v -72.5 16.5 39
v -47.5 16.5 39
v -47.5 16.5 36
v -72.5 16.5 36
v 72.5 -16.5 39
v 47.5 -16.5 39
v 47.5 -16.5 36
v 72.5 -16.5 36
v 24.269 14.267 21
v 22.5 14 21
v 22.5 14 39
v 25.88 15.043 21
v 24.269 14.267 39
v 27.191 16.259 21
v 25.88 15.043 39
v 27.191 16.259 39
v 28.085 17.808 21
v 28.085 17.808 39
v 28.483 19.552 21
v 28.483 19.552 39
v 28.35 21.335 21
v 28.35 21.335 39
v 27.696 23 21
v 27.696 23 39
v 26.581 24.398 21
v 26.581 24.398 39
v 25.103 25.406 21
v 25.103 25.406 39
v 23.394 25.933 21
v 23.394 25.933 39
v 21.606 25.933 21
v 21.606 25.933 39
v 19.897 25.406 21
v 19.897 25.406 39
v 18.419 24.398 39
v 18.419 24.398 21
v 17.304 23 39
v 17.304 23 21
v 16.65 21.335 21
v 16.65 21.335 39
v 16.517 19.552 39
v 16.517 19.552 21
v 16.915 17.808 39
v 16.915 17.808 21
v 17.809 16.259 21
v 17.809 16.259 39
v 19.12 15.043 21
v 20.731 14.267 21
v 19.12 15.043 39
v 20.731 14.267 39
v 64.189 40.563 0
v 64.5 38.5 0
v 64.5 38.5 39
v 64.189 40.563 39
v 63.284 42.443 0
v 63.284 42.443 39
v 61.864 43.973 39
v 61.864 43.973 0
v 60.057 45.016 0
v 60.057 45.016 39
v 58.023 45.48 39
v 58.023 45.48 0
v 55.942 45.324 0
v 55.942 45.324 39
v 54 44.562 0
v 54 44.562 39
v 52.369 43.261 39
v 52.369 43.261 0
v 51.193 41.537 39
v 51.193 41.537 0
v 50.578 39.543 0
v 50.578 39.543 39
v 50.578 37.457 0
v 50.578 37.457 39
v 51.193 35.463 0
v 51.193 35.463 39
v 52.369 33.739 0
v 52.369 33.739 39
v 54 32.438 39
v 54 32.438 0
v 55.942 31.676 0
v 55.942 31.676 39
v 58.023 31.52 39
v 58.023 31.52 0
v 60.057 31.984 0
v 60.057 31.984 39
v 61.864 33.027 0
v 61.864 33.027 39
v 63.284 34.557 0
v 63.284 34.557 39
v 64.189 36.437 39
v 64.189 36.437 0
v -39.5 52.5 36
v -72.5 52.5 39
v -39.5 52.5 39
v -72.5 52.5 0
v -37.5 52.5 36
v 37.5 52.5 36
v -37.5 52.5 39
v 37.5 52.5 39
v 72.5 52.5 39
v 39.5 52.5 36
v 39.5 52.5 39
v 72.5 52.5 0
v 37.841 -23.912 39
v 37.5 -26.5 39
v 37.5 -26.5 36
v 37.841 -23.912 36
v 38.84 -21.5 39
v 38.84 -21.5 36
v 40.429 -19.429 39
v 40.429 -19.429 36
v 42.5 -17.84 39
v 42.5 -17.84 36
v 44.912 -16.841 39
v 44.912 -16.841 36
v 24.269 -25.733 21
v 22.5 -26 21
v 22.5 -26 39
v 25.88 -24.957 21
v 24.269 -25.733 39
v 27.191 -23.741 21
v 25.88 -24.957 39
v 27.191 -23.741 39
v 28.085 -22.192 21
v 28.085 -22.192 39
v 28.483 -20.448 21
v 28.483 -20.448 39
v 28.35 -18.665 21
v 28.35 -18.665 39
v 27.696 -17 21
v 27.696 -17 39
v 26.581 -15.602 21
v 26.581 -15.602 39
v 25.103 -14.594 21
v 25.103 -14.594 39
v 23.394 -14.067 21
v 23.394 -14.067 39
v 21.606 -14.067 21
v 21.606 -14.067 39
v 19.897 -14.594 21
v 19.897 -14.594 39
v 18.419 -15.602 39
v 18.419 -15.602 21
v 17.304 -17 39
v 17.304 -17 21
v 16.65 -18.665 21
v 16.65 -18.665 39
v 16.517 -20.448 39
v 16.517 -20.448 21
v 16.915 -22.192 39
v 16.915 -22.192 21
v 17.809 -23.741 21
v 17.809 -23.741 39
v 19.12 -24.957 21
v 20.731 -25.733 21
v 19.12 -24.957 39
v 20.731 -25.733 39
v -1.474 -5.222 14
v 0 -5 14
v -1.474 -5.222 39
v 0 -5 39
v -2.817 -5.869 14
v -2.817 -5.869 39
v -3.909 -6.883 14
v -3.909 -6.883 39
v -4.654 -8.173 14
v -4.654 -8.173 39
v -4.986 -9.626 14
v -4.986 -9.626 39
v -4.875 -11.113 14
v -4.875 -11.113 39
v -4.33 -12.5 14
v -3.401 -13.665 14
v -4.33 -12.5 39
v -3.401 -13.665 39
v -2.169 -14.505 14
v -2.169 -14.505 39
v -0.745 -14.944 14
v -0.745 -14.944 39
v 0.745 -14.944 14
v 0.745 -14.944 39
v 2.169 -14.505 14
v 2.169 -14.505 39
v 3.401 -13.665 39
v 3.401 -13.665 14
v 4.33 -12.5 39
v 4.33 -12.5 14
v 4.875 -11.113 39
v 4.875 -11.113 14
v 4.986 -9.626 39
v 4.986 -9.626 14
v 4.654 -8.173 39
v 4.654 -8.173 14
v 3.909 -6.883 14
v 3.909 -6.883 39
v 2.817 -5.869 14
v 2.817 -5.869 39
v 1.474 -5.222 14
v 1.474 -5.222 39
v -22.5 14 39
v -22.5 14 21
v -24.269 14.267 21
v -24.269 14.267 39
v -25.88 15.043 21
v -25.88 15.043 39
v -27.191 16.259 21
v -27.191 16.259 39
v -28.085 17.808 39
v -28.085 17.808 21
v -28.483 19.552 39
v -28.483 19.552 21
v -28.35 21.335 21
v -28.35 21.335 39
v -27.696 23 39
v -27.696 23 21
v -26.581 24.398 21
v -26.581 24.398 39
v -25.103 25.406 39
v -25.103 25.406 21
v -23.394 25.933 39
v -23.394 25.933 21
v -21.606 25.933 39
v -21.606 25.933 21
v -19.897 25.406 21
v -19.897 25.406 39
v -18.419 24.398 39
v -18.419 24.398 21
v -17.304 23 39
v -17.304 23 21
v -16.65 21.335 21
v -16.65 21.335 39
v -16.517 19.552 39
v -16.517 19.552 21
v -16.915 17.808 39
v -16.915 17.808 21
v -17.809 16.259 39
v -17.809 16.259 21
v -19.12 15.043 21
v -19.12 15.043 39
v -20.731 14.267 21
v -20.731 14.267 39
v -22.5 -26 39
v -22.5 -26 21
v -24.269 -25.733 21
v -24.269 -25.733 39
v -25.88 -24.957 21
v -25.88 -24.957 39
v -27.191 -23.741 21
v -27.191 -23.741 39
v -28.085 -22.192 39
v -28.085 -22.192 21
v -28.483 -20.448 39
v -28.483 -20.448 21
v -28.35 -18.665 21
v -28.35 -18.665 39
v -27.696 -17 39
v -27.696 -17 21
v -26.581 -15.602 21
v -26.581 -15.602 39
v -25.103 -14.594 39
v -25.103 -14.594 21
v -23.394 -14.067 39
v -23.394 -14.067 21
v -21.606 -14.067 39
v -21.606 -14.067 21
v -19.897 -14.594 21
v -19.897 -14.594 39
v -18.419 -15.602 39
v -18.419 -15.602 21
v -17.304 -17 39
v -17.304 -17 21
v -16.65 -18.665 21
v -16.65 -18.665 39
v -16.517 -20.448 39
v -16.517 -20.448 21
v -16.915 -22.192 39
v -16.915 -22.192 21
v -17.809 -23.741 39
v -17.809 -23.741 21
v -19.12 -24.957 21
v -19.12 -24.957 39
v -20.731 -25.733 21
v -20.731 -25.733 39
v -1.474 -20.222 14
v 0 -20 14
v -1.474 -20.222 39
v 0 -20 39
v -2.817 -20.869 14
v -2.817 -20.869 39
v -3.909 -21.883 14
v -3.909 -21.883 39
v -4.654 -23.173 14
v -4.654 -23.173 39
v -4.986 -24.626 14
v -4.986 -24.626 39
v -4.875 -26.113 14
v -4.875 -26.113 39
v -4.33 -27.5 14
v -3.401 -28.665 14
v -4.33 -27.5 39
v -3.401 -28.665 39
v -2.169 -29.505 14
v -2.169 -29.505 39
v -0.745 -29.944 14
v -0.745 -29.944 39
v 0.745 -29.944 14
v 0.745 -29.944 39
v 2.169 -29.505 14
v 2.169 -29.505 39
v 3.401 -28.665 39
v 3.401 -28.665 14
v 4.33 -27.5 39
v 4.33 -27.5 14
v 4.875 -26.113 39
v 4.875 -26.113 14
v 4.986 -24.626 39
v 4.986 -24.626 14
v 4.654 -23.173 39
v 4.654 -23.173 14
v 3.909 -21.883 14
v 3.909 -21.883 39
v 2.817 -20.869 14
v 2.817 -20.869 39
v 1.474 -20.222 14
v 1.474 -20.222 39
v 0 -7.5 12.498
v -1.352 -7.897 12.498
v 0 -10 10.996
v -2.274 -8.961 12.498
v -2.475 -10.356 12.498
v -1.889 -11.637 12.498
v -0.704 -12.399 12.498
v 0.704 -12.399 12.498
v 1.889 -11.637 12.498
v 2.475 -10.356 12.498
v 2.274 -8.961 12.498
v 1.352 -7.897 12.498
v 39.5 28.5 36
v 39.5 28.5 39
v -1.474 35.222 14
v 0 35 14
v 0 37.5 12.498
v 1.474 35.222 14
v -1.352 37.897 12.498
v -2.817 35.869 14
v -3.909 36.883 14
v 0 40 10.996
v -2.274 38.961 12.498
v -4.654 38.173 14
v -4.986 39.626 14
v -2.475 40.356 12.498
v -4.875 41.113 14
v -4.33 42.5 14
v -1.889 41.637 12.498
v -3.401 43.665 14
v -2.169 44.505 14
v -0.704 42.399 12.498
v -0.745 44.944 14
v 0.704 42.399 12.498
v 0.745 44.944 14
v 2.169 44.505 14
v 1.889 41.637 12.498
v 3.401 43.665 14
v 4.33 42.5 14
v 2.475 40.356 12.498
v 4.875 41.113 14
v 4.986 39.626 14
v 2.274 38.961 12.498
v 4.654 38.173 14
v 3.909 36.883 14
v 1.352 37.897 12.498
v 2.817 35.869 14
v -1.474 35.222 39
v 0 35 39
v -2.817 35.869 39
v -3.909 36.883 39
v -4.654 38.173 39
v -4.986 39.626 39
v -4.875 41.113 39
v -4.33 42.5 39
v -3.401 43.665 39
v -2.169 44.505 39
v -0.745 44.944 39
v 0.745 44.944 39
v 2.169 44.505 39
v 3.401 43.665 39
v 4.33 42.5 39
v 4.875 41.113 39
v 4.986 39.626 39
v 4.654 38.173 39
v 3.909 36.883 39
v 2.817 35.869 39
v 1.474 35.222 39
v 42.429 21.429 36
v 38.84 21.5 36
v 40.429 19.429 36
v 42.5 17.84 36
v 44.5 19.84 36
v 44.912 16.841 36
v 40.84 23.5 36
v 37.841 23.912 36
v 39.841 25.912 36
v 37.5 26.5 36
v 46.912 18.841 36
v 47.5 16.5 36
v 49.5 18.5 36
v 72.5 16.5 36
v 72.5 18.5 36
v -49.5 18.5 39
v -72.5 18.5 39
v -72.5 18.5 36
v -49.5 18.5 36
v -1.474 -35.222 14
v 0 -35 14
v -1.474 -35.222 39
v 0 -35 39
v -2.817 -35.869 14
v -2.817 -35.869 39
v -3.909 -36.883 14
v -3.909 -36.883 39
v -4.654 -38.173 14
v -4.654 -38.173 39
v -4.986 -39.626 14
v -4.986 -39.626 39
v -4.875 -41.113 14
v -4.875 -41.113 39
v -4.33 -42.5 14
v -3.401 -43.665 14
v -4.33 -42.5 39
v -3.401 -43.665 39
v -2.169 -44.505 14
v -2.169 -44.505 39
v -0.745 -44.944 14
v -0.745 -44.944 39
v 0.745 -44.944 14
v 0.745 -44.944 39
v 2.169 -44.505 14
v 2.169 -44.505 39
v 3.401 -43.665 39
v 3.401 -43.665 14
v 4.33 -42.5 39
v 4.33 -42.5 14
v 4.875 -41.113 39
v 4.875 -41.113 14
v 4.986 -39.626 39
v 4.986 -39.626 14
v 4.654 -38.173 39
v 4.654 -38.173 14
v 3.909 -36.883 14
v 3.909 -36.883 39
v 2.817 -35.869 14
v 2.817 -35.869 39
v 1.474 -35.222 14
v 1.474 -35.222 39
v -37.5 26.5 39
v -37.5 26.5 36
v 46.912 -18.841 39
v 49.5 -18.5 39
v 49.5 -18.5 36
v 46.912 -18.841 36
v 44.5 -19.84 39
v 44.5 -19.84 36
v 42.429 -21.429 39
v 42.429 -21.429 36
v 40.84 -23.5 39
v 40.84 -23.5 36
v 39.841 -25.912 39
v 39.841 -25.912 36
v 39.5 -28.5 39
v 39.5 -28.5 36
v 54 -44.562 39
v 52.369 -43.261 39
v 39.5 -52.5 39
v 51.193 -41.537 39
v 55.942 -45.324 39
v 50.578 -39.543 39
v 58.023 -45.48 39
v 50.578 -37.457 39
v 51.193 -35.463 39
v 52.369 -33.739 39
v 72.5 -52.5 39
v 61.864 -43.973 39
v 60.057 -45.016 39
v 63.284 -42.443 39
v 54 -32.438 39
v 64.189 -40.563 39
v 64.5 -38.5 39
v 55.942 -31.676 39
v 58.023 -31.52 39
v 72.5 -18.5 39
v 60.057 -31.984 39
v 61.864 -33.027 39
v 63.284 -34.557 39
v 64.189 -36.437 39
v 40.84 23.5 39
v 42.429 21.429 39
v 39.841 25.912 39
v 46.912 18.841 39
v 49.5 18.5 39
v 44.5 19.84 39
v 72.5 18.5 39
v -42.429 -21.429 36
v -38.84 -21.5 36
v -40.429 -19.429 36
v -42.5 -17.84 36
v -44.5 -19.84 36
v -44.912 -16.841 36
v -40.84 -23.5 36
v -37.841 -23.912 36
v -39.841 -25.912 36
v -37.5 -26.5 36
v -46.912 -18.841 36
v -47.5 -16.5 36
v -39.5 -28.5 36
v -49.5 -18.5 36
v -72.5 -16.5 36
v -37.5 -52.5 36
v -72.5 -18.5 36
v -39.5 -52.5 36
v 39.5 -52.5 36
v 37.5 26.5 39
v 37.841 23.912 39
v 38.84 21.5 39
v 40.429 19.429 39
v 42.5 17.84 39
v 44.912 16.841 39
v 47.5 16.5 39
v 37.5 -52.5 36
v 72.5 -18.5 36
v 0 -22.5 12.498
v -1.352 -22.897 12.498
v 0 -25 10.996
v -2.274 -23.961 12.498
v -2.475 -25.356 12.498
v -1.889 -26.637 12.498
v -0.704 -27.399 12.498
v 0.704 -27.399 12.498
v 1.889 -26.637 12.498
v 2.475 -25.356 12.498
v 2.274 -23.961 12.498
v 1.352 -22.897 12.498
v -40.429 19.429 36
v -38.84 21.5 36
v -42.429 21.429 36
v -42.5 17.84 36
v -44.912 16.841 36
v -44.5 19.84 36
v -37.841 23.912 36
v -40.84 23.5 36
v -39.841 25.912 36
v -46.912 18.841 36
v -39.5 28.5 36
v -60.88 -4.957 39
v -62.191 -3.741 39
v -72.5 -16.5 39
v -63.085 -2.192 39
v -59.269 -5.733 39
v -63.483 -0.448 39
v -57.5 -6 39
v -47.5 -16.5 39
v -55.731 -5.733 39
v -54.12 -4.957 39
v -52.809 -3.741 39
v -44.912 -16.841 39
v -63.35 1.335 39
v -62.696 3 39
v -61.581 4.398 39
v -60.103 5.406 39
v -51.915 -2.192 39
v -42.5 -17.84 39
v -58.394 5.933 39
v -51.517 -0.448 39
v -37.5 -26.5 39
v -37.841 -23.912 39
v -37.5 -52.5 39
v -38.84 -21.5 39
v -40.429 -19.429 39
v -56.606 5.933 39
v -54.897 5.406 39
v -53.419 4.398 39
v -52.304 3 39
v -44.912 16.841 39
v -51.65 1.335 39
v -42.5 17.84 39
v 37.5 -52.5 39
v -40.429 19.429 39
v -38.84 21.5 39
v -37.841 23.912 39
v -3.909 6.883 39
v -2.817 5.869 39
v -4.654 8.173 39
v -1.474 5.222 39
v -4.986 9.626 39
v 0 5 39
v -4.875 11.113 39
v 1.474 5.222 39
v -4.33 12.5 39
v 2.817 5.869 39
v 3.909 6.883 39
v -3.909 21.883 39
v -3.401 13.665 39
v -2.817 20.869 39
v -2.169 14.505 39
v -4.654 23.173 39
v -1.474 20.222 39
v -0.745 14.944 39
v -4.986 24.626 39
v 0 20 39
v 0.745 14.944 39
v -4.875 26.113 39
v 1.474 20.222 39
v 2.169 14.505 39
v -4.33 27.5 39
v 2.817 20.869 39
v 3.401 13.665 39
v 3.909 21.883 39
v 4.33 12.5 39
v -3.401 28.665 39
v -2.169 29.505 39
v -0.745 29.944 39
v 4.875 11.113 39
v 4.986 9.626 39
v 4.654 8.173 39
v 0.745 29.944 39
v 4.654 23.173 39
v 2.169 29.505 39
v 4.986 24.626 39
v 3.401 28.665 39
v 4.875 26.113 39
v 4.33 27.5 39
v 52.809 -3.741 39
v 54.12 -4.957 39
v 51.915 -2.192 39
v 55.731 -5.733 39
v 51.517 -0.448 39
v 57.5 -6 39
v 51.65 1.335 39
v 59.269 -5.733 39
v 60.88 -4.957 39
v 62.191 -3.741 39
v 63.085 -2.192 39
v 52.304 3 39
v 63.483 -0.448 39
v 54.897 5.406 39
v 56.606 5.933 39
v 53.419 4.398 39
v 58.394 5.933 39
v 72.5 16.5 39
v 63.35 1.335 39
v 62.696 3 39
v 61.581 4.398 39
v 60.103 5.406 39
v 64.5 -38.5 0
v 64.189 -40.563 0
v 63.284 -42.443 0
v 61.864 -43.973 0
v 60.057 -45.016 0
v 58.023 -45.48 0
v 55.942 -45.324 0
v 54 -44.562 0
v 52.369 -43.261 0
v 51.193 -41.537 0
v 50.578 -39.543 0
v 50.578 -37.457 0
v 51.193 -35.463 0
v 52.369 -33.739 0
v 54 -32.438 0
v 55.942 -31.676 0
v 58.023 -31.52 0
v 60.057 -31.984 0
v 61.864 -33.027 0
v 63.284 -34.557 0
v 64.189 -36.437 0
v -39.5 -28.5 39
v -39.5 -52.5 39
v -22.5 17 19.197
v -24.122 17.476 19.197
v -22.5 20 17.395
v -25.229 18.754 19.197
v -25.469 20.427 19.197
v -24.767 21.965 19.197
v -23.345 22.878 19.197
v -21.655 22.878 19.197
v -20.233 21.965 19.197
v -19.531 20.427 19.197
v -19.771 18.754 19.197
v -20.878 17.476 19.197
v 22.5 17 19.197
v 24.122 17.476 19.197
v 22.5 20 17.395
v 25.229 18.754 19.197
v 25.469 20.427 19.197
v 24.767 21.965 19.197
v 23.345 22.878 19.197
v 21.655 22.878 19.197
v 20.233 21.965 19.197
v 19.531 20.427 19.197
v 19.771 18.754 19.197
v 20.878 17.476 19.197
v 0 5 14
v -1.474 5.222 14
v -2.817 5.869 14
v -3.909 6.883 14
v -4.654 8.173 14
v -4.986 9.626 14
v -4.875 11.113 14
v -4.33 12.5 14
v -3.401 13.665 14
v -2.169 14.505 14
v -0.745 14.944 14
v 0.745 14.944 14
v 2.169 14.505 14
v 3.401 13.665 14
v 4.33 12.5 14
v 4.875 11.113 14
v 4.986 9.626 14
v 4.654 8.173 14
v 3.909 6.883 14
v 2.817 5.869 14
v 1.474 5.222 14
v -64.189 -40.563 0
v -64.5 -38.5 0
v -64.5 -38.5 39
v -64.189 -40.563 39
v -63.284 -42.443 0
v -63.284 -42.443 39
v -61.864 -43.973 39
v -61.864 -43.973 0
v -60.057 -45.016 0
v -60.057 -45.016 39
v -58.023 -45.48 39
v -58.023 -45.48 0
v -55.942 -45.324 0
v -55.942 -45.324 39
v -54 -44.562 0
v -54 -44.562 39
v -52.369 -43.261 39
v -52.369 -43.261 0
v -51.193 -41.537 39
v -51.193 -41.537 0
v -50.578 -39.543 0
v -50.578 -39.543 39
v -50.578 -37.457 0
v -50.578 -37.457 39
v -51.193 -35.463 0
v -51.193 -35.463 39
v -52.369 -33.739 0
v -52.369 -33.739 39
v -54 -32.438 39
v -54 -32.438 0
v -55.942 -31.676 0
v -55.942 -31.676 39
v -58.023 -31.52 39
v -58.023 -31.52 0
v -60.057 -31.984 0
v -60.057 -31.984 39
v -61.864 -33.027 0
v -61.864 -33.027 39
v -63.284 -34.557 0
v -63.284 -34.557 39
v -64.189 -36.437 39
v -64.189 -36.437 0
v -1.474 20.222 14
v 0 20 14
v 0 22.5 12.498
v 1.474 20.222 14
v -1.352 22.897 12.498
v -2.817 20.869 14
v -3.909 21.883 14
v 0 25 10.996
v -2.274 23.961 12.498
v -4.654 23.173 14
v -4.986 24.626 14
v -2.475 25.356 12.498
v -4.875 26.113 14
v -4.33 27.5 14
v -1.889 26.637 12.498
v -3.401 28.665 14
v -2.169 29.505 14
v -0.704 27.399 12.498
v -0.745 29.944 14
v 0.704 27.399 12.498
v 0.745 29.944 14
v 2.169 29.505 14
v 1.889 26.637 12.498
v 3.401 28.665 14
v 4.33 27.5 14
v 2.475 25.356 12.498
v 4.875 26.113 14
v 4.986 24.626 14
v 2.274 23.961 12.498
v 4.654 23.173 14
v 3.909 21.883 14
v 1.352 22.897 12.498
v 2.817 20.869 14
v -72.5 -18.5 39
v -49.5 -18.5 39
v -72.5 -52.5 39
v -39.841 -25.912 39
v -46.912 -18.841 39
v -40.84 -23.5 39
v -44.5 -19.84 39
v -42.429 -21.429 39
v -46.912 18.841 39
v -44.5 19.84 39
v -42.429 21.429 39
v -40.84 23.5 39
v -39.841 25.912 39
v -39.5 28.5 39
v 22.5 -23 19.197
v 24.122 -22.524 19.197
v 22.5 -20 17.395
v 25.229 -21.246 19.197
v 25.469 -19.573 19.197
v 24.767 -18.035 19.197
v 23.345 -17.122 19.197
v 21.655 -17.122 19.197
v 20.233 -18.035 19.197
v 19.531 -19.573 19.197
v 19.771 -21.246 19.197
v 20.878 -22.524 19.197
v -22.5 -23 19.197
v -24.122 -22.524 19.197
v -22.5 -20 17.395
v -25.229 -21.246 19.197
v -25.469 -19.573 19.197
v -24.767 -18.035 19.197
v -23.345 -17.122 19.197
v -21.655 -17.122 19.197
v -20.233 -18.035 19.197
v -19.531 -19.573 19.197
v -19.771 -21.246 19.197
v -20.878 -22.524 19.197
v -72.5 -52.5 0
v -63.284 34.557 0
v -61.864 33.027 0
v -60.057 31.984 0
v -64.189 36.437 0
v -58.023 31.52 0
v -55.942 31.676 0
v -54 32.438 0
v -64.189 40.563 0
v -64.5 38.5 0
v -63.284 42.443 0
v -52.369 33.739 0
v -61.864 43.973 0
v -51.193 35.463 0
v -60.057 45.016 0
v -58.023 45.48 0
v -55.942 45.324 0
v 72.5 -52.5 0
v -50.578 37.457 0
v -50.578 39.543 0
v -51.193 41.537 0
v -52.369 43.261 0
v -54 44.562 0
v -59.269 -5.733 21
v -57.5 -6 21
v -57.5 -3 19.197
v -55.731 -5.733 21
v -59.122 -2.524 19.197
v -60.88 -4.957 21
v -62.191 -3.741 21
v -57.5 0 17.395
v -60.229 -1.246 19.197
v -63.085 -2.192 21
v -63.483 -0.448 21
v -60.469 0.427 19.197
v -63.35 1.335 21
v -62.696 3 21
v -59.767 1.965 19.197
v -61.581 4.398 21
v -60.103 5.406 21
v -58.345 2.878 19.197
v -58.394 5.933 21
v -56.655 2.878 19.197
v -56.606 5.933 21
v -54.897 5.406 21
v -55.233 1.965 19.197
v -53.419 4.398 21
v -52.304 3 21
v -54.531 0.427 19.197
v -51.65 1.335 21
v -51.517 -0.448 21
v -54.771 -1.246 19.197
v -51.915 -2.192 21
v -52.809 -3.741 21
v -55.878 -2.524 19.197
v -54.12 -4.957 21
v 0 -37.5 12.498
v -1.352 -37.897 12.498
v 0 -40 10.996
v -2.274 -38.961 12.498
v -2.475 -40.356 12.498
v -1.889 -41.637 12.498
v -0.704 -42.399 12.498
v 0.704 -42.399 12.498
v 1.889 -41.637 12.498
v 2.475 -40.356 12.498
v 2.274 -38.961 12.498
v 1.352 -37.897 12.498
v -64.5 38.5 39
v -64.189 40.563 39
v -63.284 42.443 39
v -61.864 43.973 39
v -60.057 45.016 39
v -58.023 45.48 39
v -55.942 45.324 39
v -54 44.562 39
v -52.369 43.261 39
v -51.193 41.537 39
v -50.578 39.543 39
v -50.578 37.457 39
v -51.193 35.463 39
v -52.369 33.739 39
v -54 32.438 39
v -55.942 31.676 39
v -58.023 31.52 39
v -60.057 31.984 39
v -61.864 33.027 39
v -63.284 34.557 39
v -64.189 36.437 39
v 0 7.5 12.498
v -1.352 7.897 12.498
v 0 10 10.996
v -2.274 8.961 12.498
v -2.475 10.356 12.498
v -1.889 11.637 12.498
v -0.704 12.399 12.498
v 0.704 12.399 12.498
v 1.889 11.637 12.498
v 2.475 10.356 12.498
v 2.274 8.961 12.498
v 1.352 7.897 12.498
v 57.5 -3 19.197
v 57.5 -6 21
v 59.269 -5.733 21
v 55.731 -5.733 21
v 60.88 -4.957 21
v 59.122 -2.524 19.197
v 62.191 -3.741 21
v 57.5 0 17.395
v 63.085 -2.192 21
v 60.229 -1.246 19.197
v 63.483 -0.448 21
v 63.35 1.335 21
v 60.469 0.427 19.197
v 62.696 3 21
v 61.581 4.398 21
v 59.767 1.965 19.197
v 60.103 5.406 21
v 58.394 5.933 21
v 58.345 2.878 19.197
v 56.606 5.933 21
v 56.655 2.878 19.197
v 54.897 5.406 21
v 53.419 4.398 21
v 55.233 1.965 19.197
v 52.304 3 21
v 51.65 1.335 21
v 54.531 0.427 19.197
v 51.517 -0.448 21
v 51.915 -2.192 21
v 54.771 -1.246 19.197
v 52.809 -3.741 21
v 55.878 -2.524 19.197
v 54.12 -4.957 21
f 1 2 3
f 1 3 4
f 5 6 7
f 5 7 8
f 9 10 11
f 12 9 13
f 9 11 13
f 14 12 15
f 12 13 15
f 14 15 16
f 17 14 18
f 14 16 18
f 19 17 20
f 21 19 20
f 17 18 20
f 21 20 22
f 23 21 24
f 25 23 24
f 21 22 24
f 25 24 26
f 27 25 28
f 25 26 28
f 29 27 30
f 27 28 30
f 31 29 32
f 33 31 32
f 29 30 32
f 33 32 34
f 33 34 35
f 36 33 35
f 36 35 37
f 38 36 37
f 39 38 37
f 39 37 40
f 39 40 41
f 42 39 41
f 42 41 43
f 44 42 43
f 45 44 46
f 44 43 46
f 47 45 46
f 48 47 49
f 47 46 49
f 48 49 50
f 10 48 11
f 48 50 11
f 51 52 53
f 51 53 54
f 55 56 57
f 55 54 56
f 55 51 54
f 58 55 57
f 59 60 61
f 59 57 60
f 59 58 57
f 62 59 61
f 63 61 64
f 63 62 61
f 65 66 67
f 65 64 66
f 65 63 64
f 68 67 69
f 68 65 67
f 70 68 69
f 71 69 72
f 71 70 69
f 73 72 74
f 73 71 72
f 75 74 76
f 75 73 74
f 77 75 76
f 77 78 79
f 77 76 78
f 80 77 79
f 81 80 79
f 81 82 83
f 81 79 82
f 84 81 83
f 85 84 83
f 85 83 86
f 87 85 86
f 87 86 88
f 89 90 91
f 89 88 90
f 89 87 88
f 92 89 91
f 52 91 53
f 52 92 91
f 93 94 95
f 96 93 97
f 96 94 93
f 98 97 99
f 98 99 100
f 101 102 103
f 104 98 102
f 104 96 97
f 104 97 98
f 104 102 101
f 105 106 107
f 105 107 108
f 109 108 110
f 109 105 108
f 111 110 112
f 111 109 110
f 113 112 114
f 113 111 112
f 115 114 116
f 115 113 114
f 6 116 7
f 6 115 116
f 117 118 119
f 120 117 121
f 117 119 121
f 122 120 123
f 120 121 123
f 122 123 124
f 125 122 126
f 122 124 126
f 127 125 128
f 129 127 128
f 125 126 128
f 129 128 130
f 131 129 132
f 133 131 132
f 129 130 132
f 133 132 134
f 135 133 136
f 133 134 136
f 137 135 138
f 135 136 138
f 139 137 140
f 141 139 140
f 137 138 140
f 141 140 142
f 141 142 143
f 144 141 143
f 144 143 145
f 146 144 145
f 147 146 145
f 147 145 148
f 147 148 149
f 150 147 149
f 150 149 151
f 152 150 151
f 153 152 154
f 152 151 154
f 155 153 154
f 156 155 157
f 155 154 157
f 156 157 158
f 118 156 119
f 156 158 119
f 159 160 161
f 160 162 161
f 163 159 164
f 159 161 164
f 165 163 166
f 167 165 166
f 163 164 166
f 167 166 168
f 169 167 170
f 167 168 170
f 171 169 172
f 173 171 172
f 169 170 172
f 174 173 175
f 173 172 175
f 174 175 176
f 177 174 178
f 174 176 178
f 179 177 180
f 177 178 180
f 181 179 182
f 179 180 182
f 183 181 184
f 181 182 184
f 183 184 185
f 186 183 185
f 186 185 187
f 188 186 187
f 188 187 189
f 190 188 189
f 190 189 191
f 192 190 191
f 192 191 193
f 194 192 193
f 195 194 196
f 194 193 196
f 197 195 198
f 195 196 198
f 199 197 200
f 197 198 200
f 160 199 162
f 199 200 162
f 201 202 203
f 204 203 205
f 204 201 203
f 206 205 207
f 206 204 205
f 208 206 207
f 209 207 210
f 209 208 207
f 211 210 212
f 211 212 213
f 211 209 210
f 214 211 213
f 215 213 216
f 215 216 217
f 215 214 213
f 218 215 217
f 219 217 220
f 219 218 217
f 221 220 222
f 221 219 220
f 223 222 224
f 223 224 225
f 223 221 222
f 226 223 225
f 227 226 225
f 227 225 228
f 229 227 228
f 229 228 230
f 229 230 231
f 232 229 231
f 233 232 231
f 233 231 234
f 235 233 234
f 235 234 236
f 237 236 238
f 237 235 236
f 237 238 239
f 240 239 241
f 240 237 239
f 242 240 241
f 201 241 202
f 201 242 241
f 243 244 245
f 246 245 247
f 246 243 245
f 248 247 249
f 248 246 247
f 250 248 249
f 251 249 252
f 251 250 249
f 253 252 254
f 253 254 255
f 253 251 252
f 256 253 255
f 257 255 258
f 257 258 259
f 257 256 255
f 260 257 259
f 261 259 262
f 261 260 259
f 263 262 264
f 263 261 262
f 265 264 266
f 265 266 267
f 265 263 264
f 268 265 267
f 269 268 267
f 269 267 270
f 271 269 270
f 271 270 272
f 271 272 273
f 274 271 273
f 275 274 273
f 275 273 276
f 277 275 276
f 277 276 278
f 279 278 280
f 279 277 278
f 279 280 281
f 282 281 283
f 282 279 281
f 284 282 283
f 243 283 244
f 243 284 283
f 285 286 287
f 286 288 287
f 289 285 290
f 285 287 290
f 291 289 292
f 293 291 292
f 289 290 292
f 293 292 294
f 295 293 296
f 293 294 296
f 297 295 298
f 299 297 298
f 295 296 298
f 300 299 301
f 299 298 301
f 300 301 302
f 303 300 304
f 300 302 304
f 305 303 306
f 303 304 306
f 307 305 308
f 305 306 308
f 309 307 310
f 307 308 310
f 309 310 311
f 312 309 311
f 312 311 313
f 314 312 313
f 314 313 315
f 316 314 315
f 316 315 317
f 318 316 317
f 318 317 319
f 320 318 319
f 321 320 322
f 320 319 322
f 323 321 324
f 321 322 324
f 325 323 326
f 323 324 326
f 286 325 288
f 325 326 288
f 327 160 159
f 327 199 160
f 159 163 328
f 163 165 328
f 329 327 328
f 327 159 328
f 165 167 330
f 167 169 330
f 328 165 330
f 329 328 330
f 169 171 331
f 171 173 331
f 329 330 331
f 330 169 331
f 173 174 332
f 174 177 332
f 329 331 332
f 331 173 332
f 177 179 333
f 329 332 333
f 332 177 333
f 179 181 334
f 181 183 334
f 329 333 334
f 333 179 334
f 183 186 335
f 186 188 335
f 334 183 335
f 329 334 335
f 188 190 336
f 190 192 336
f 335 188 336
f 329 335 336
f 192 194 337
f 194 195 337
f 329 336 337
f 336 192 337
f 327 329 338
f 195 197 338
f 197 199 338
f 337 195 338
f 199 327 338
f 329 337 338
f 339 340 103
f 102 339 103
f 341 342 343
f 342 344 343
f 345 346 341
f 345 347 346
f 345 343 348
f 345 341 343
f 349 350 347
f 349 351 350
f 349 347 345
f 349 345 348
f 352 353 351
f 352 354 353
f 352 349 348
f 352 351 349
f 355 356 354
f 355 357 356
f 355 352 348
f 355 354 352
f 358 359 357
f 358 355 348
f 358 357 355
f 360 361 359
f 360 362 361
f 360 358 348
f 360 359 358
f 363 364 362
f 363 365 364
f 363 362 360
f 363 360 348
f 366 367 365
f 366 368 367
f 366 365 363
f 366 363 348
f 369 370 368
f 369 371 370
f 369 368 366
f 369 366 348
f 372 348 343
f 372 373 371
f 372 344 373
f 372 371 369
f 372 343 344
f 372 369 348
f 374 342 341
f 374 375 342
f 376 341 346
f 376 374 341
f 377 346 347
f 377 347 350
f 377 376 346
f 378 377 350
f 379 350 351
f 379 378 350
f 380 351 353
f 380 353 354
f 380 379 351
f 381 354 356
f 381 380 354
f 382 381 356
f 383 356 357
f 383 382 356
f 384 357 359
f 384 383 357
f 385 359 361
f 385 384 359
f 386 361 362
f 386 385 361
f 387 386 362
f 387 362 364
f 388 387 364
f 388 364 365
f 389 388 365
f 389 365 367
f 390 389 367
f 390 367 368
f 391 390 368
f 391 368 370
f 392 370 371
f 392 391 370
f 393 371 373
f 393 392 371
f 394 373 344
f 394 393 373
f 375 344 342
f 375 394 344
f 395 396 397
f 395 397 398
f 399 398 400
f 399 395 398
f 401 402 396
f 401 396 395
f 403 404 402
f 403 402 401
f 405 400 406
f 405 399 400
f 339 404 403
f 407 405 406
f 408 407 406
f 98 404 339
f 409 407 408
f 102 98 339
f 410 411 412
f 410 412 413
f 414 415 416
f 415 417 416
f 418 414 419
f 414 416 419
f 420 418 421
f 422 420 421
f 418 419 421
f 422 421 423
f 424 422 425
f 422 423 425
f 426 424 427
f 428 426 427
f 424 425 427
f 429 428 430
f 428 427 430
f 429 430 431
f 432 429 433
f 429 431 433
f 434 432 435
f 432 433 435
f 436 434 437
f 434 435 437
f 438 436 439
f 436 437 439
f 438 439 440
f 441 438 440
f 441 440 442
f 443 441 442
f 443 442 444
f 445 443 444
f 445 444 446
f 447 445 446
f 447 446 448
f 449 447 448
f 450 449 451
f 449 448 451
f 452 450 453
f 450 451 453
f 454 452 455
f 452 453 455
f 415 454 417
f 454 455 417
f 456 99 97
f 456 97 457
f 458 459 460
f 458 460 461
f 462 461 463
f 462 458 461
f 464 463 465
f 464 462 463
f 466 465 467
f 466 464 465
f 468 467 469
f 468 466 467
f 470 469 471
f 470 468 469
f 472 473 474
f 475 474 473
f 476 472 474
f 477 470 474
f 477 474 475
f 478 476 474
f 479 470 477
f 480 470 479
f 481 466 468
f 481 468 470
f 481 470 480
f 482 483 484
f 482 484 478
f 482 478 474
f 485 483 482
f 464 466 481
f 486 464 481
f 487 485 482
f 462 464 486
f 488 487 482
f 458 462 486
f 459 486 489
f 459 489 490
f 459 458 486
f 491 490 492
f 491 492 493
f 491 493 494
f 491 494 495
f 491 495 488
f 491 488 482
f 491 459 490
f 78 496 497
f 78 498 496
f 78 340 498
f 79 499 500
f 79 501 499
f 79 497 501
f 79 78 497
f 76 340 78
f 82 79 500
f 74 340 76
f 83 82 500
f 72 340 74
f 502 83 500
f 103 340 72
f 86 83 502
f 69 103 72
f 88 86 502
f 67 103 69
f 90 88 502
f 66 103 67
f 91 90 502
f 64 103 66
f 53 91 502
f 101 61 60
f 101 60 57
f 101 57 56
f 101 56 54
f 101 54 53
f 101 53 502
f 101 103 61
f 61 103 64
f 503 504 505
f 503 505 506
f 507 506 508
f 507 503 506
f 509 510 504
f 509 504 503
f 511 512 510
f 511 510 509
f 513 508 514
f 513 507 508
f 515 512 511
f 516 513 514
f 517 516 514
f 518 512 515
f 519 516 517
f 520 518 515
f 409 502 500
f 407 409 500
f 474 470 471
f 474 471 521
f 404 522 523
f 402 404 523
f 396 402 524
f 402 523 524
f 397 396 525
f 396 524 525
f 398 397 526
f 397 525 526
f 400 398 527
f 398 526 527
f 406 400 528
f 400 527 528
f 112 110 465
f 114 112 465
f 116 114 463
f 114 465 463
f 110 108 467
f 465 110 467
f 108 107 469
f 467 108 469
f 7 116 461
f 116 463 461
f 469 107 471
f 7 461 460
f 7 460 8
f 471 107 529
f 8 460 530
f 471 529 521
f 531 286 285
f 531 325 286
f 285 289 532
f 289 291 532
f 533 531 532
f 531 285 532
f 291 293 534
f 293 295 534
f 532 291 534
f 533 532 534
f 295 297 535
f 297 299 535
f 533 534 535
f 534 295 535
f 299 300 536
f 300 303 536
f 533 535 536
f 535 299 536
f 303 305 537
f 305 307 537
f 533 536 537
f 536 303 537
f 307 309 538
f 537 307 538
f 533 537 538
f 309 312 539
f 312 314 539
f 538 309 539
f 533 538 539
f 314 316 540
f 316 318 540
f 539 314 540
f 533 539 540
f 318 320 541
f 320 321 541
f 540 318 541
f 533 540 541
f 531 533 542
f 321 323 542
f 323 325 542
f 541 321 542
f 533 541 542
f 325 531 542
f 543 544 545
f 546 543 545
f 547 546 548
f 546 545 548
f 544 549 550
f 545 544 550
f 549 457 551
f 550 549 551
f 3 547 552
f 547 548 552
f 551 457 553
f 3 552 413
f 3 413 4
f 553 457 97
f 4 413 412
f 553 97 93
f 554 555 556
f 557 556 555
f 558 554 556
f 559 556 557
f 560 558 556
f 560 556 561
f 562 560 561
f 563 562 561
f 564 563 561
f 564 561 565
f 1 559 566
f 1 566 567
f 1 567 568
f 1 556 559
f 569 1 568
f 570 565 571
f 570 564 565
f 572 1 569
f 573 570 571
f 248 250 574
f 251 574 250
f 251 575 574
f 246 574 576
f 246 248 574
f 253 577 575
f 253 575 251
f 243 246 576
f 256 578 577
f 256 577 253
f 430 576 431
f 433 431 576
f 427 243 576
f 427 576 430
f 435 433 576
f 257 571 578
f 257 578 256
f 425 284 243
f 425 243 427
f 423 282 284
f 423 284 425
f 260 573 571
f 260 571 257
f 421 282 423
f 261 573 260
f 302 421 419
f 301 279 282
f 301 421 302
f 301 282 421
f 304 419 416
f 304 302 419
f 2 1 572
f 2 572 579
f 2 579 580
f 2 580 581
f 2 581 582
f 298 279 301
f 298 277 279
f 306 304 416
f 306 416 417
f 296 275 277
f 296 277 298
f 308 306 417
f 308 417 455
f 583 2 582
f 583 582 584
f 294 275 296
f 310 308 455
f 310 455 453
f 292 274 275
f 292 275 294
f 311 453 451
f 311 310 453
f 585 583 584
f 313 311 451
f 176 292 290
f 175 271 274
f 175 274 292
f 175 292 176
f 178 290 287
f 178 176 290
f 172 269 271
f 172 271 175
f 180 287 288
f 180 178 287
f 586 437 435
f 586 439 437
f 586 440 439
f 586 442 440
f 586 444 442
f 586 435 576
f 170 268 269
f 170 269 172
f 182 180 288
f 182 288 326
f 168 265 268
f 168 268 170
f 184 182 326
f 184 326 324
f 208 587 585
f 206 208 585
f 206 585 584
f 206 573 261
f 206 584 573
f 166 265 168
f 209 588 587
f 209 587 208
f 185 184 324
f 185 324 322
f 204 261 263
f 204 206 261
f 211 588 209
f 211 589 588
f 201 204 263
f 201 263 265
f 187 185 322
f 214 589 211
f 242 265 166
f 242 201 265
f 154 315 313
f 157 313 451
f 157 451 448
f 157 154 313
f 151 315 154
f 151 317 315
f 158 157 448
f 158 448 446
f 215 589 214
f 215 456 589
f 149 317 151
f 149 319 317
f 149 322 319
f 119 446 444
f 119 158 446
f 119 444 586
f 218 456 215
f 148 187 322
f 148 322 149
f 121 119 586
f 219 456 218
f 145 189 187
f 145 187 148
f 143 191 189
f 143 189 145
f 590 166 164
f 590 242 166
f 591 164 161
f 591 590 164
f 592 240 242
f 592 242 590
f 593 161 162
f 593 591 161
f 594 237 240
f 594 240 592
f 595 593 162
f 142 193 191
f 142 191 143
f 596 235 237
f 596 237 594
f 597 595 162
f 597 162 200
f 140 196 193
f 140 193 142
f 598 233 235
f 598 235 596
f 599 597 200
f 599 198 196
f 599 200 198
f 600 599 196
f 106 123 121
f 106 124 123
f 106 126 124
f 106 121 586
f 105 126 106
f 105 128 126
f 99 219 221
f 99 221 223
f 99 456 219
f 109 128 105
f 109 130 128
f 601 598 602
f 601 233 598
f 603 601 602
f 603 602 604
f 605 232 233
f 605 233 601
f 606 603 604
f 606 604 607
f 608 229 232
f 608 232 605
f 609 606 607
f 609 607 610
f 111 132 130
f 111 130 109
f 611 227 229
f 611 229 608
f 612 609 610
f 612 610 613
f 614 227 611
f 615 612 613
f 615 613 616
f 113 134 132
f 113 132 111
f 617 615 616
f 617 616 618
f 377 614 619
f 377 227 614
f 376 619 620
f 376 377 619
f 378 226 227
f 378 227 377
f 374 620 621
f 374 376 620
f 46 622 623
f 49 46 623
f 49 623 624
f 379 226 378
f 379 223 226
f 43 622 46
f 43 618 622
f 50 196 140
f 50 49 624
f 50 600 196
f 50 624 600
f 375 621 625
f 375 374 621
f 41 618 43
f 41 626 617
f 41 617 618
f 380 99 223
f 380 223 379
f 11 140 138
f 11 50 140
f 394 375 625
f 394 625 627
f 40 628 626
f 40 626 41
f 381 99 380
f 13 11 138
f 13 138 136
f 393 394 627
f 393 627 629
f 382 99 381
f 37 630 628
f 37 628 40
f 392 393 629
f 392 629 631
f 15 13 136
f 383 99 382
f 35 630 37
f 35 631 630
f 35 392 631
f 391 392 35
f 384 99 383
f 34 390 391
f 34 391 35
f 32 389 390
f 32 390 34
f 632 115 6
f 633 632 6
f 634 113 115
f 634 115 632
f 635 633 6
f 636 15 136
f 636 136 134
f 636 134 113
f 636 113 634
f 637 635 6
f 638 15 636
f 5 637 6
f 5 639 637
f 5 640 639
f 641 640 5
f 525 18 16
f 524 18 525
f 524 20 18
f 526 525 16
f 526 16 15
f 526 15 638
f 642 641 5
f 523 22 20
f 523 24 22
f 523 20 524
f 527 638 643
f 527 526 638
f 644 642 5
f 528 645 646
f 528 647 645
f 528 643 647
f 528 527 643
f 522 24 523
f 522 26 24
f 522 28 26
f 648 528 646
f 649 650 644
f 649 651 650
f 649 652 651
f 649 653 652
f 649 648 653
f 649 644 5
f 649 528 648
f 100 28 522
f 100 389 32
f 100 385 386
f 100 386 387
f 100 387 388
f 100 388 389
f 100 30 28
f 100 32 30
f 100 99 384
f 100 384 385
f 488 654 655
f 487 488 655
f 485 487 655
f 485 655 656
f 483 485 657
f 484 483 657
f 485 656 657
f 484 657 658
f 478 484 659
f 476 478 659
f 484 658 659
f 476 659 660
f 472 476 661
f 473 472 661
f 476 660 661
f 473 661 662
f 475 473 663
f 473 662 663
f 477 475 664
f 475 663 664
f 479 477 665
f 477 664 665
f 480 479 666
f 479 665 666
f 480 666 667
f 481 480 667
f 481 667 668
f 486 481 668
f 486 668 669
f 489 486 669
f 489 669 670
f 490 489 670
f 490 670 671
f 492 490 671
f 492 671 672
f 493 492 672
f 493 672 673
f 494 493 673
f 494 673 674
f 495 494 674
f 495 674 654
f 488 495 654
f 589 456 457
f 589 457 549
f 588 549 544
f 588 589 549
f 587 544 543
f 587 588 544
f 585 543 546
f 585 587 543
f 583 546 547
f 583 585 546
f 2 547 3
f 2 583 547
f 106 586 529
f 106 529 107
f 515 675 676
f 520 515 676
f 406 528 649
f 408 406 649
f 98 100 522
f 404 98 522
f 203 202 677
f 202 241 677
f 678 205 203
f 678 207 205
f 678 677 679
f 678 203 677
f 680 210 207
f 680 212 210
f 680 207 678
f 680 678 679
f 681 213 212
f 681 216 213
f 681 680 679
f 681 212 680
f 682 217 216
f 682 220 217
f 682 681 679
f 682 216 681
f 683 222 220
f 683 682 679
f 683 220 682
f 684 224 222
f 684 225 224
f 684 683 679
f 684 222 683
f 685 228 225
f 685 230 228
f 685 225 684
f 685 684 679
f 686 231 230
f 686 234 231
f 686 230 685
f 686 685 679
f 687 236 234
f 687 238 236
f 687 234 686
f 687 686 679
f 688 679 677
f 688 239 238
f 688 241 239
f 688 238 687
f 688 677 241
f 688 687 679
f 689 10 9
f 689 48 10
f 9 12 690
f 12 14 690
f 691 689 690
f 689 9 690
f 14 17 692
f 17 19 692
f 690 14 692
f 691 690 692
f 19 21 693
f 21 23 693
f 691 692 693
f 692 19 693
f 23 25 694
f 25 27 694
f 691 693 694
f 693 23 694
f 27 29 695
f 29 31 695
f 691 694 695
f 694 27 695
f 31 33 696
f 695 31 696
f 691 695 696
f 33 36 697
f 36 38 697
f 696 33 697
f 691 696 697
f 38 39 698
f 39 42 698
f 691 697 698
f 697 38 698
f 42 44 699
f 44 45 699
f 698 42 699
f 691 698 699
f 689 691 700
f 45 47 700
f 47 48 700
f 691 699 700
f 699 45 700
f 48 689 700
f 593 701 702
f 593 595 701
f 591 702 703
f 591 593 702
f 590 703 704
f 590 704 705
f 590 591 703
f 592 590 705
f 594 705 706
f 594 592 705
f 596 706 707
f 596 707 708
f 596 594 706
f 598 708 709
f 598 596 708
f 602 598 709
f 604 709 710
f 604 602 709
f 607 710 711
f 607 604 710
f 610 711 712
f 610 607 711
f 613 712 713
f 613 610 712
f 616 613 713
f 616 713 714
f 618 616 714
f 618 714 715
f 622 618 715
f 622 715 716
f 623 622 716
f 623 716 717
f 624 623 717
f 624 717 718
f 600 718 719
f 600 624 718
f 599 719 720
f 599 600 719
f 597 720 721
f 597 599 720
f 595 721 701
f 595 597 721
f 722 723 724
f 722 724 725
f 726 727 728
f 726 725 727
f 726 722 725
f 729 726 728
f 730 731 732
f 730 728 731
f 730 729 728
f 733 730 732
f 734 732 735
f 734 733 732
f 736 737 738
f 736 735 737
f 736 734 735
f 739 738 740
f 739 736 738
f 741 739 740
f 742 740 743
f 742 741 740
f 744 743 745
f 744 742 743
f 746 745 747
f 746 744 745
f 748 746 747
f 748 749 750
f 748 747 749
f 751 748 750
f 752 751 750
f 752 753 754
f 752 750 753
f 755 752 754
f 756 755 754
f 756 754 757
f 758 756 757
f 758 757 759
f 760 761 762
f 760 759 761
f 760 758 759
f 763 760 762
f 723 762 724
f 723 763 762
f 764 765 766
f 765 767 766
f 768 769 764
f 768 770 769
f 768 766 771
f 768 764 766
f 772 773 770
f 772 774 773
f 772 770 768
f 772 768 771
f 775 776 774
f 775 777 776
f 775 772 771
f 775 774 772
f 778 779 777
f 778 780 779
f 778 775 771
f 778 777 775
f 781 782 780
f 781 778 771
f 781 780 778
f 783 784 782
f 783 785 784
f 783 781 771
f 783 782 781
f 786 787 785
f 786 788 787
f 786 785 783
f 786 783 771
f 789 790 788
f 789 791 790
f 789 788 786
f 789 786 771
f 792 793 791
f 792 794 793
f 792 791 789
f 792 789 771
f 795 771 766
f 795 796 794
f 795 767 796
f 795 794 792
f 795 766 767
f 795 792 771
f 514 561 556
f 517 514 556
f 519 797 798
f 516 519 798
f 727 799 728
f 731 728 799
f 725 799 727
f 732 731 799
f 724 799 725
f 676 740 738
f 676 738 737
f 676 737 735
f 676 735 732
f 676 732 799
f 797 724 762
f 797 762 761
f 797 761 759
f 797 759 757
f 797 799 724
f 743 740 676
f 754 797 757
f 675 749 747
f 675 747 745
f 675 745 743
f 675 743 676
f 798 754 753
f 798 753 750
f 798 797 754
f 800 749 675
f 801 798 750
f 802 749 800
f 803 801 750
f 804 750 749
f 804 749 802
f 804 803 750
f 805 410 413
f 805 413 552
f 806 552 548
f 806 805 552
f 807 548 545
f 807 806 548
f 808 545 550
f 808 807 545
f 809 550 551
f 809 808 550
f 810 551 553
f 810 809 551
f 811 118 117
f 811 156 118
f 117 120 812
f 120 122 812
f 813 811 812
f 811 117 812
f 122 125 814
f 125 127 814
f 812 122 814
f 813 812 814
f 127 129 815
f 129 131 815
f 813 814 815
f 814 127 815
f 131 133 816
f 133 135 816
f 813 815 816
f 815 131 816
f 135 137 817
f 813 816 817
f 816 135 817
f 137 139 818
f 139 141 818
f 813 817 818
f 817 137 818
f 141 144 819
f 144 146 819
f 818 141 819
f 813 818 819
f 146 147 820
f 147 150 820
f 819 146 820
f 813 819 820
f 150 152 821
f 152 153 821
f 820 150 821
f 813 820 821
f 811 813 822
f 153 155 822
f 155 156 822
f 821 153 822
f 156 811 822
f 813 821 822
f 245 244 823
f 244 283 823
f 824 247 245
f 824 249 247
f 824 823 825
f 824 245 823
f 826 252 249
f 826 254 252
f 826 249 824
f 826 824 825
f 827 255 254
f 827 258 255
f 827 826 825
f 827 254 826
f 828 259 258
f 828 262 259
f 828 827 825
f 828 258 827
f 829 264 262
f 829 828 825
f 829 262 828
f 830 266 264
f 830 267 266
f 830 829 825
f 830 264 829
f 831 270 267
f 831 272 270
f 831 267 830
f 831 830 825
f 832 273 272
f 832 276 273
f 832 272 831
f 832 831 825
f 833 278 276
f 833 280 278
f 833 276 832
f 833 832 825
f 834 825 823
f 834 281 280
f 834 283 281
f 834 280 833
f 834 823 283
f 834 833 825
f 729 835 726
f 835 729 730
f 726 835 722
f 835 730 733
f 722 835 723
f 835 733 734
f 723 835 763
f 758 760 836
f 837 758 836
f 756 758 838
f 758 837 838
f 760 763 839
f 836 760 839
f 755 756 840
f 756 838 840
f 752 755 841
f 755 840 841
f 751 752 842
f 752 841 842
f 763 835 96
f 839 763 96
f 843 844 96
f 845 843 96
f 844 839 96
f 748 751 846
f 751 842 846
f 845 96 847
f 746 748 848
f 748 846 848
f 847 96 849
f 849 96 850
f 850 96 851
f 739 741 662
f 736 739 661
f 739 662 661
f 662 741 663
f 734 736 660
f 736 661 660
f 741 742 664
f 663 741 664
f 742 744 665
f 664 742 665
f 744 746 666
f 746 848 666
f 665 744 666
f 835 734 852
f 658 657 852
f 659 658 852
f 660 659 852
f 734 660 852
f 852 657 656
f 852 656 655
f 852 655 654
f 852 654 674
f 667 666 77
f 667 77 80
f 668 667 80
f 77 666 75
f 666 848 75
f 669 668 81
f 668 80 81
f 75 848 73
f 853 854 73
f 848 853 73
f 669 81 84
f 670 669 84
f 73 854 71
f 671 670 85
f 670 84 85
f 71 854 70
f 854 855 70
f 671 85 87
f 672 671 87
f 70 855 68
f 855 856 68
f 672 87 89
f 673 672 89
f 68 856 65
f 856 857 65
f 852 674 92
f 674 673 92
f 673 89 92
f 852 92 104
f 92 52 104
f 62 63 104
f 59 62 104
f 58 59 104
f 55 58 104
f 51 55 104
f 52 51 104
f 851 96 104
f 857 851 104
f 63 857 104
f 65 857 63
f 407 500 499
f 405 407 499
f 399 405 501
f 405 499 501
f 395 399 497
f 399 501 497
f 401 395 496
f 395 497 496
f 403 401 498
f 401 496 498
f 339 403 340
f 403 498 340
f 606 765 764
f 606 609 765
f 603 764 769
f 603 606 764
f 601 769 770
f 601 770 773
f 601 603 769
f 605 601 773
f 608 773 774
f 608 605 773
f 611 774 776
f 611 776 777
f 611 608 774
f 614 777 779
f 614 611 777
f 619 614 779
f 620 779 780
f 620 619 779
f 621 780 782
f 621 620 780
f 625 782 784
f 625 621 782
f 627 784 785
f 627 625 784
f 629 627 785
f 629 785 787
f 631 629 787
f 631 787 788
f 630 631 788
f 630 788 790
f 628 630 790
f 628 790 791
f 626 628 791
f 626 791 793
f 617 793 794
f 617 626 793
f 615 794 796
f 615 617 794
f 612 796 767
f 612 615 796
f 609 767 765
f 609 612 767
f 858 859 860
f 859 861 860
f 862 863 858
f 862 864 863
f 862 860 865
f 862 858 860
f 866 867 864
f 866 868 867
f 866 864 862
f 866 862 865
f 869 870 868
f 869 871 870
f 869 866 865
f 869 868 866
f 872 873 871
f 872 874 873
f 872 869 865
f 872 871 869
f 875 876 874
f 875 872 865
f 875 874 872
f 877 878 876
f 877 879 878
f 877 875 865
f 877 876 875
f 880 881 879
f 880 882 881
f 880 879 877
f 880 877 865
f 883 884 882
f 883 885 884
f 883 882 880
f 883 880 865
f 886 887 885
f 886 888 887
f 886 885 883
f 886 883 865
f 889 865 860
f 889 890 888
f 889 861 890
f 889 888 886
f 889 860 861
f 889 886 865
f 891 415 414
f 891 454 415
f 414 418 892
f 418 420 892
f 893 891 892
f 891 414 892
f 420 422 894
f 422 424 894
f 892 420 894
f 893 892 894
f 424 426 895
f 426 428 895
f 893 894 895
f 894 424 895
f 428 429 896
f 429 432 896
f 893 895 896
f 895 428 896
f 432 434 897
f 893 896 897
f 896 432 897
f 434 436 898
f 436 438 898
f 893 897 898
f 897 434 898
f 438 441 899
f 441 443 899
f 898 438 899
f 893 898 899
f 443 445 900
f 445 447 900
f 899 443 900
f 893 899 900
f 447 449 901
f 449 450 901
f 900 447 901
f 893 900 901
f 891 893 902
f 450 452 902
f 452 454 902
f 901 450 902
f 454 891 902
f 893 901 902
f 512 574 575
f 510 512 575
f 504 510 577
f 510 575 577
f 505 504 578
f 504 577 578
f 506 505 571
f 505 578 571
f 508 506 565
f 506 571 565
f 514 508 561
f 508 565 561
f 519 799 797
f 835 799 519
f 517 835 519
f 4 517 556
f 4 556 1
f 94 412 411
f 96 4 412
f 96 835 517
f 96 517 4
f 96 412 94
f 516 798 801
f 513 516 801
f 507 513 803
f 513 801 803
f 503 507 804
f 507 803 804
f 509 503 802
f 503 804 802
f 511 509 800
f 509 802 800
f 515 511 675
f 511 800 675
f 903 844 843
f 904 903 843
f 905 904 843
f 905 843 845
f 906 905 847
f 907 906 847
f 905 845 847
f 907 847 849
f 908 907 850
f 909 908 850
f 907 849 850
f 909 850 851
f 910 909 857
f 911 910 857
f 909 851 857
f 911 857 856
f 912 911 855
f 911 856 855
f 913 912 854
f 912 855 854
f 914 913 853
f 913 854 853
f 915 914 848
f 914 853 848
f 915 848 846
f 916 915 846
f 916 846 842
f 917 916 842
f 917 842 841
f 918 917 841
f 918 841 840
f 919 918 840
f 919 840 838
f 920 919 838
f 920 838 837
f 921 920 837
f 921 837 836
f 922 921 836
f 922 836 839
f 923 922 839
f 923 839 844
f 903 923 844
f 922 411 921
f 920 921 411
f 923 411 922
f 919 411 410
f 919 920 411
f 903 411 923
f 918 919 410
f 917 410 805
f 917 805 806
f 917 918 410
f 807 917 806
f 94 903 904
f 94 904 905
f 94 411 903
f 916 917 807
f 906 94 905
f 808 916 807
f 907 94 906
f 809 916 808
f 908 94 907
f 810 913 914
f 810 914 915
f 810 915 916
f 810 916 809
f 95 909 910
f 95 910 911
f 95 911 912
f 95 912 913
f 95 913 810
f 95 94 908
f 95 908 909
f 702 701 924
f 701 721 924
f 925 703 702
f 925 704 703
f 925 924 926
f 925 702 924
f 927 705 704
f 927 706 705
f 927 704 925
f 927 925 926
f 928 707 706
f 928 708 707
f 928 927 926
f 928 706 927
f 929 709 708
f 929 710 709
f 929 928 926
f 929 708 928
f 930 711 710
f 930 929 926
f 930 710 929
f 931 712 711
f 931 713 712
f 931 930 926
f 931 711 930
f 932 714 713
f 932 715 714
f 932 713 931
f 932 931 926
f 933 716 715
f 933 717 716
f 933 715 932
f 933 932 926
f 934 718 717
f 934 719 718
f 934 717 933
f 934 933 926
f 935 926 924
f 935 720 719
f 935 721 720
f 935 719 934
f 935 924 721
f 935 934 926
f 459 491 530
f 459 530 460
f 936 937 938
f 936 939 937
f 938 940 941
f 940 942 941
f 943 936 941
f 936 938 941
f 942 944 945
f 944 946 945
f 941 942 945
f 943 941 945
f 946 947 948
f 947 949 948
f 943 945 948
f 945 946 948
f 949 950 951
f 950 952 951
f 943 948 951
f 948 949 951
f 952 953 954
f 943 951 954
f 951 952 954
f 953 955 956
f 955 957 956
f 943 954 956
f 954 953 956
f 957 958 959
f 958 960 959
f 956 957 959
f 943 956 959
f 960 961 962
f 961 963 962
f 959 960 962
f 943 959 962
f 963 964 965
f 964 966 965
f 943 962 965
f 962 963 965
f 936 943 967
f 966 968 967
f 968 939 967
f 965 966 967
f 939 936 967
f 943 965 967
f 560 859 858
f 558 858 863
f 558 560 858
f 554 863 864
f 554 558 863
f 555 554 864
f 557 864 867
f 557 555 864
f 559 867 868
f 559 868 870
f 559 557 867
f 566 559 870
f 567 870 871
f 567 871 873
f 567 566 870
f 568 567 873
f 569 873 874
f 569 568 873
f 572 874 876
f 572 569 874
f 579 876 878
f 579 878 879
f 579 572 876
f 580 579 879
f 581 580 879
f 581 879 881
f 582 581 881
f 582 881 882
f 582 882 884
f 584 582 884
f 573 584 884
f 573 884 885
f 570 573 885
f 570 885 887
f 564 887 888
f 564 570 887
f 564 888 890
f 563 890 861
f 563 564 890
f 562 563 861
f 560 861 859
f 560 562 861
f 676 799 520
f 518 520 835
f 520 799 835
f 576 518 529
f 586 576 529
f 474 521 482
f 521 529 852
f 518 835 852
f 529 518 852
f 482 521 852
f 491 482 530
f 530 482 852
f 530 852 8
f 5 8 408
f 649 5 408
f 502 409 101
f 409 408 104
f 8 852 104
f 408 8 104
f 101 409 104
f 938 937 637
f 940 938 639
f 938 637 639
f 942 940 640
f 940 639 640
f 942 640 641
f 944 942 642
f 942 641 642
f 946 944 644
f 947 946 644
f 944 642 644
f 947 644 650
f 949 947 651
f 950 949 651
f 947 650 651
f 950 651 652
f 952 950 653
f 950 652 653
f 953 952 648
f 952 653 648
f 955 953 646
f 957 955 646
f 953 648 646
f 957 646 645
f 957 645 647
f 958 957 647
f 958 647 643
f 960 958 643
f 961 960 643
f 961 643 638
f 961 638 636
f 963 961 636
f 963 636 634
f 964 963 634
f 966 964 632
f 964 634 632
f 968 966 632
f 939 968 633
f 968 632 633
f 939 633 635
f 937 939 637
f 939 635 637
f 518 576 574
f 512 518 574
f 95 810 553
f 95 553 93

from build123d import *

# Parameters (mm, degrees)
CROQUIS1_W                              = 145
CROQUIS1_H                              = 105
SALIENTE_EXTRUIR1_DEPTH                 = 39
TALADRO1_D                              = 14
SIMETR_A2_COPY_1_D                      = 14
TALADRO_DE_MARGEN_PARA_M1_61_AT_2_COUNT = 2
TALADRO_DE_MARGEN_PARA_M1_61_AT_2_PITCH = 15
TALADRO_DE_MARGEN_PARA_M1_61_AT_3_COUNT = 2
TALADRO_DE_MARGEN_PARA_M1_61_AT_3_PITCH = 30
TALADRO_DE_MARGEN_PARA_M1_62_AT_2_COUNT = 2
TALADRO_DE_MARGEN_PARA_M1_62_AT_2_PITCH = 40.311288741
TALADRO_DE_MARGEN_PARA_M1_62_AT_3_COUNT = 2
TALADRO_DE_MARGEN_PARA_M1_62_AT_3_PITCH = 40.311288741
CORTAR_EXTRUIR1_DEPTH                   = 3
SIMETR_A6_COPY_1_DEPTH                  = 3


with BuildPart() as part:
    # Croquis1 → Saliente-Extruir1 (new body)
    with BuildSketch(Plane.XY):
        Rectangle(CROQUIS1_W, CROQUIS1_H)
    extrude(amount=SALIENTE_EXTRUIR1_DEPTH)

    # Taladro1 (through all)
    with Locations(Plane.XY.offset(39)):
        with Locations((-57.5, 38.5)):
            taladro1 = Hole(TALADRO1_D / 2)

    # Simetría1: Taladro1 across plane
    add(taladro1.mirror(Plane.ZX), mode=Mode.SUBTRACT)

    # Simetría2: Taladro1 across plane
    add(taladro1.mirror(Plane(origin=(0, 0, 0), x_dir=(0, 0, 1), z_dir=(1, 0, 0))), mode=Mode.SUBTRACT)

    # Simetría2 copy 1 (through all)
    with Locations(Plane(origin=(0, 0, 39), x_dir=(-1, 0, 0), z_dir=(0, 0, 1))):
        with Locations((-57.5, 38.5)):
            Hole(SIMETR_A2_COPY_1_D / 2)

    # Croquis7 → Taladro de margen para M1.61 (revolve, cut)
    with BuildSketch(Plane(origin=(0, 40, 39), x_dir=(0, -1, 0), z_dir=(1, 0, 0))):
        Polygon((0, 0), (0, 28.004303095), (5, 25), (5, 0), align=None)
    taladro_de_margen_para_m1_61 = revolve(axis=Axis((0, 40, 45.35), (0, 0, -1)), mode=Mode.SUBTRACT)

    # Taladro de margen para M1.61 at 2: Taladro de margen para M1.61 ×2
    with Locations(*[(0, -i * TALADRO_DE_MARGEN_PARA_M1_61_AT_2_PITCH, 0) for i in range(1, TALADRO_DE_MARGEN_PARA_M1_61_AT_2_COUNT)]):
        add(taladro_de_margen_para_m1_61, mode=Mode.SUBTRACT)

    # Taladro de margen para M1.61 at 3: Taladro de margen para M1.61 ×2
    with Locations(*[(0, -i * TALADRO_DE_MARGEN_PARA_M1_61_AT_3_PITCH, 0) for i in range(1, TALADRO_DE_MARGEN_PARA_M1_61_AT_3_COUNT)]):
        add(taladro_de_margen_para_m1_61, mode=Mode.SUBTRACT)

    # Simetría3: Taladro de margen para M1.61 across plane
    add(taladro_de_margen_para_m1_61.mirror(Plane.ZX), mode=Mode.SUBTRACT)

    # Simetría3 copy 1 sketch → Simetría3 copy 1 (revolve, cut)
    with BuildSketch(Plane(origin=(0, -25, 39), x_dir=(0, 1, 0), z_dir=(1, 0, 0))):
        Polygon((0, 0), (0, -28.004303095), (5, -25), (5, 0), align=None)
    revolve(axis=Axis((0, -25, 45.35), (0, 0, 1)), mode=Mode.SUBTRACT)

    # Simetría3 copy 2 sketch → Simetría3 copy 2 (revolve, cut)
    with BuildSketch(Plane(origin=(0, -10, 39), x_dir=(0, 1, 0), z_dir=(1, 0, 0))):
        Polygon((0, 0), (0, -28.004303095), (5, -25), (5, 0), align=None)
    revolve(axis=Axis((0, -10, 45.35), (0, 0, 1)), mode=Mode.SUBTRACT)

    # Croquis9 → Taladro de margen para M1.62 (revolve, cut)
    with BuildSketch(Plane(origin=(-57.5, 0, 39), x_dir=(0, -1, 0), z_dir=(1, 0, 0))):
        Polygon((0, 0), (0, 21.605163714), (6, 18), (6, 0), align=None)
    taladro_de_margen_para_m1_62 = revolve(axis=Axis((-57.5, 0, 45.35), (0, 0, -1)), mode=Mode.SUBTRACT)

    # Taladro de margen para M1.62 at 2: Taladro de margen para M1.62 ×2
    with Locations(*[Vector(0.868243142, 0.496138938, 0) * (i * TALADRO_DE_MARGEN_PARA_M1_62_AT_2_PITCH) for i in range(1, TALADRO_DE_MARGEN_PARA_M1_62_AT_2_COUNT)]):
        add(taladro_de_margen_para_m1_62, mode=Mode.SUBTRACT)

    # Taladro de margen para M1.62 at 3: Taladro de margen para M1.62 ×2
    with Locations(*[Vector(0.868243142, -0.496138938, 0) * (i * TALADRO_DE_MARGEN_PARA_M1_62_AT_3_PITCH) for i in range(1, TALADRO_DE_MARGEN_PARA_M1_62_AT_3_COUNT)]):
        add(taladro_de_margen_para_m1_62, mode=Mode.SUBTRACT)

    # Simetría4: Taladro de margen para M1.62 across plane
    add(taladro_de_margen_para_m1_62.mirror(Plane(origin=(0, 0, 0), x_dir=(0, 0, 1), z_dir=(1, 0, 0))), mode=Mode.SUBTRACT)

    # Simetría4 copy 1 sketch → Simetría4 copy 1 (revolve, cut)
    with BuildSketch(Plane(origin=(22.5, 20, 39), x_dir=(0, -1, 0), z_dir=(-1, 0, 0))):
        Polygon((0, 0), (0, -21.605163714), (6, -18), (6, 0), align=None)
    revolve(axis=Axis((22.5, 20, 45.35), (0, 0, 1)), mode=Mode.SUBTRACT)

    # Simetría4 copy 2 sketch → Simetría4 copy 2 (revolve, cut)
    with BuildSketch(Plane(origin=(22.5, -20, 39), x_dir=(0, -1, 0), z_dir=(-1, 0, 0))):
        Polygon((0, 0), (0, -21.605163714), (6, -18), (6, 0), align=None)
    revolve(axis=Axis((22.5, -20, 45.35), (0, 0, 1)), mode=Mode.SUBTRACT)

    # Croquis10 → Cortar-Extruir1 (cut)
    with BuildSketch(Plane.XY.offset(39)):
        with BuildLine():
            Line((-37.5, 52.5), (-37.5, 26.5))
            ThreePointArc((-37.5, 26.5), (-40.428932188, 19.428932188), (-47.5, 16.5))
            Line((-47.5, 16.5), (-72.5, 16.5))
            Line((-72.5, 16.5), (-72.5, 18.5))
            Line((-72.5, 18.5), (-49.5, 18.5))
            ThreePointArc((-49.5, 18.5), (-42.428932188, 21.428932188), (-39.5, 28.5))
            Line((-39.5, 28.5), (-39.5, 52.5))
            Line((-39.5, 52.5), (-37.5, 52.5))
        make_face()
    cortar_extruir1 = extrude(amount=-CORTAR_EXTRUIR1_DEPTH, mode=Mode.SUBTRACT)

    # Simetría5: Cortar-Extruir1 across plane
    add(cortar_extruir1.mirror(Plane.ZX), mode=Mode.SUBTRACT)

    # Simetría6: Cortar-Extruir1 across plane
    add(cortar_extruir1.mirror(Plane(origin=(0, 0, 0), x_dir=(0, 0, 1), z_dir=(1, 0, 0))), mode=Mode.SUBTRACT)

    # Simetría6 copy 1 sketch → Simetría6 copy 1 (cut)
    with BuildSketch(Plane(origin=(0, 0, 39), x_dir=(-1, 0, 0), z_dir=(0, 0, 1))):
        with BuildLine():
            Line((-37.5, 52.5), (-37.5, 26.5))
            ThreePointArc((-37.5, 26.5), (-40.428932188, 19.428932188), (-47.5, 16.5))
            Line((-47.5, 16.5), (-72.5, 16.5))
            Line((-72.5, 16.5), (-72.5, 18.5))
            Line((-72.5, 18.5), (-49.5, 18.5))
            ThreePointArc((-49.5, 18.5), (-42.428932188, 21.428932188), (-39.5, 28.5))
            Line((-39.5, 28.5), (-39.5, 52.5))
            Line((-39.5, 52.5), (-37.5, 52.5))
        make_face()
    extrude(amount=-SIMETR_A6_COPY_1_DEPTH, mode=Mode.SUBTRACT)


solid = part.part
